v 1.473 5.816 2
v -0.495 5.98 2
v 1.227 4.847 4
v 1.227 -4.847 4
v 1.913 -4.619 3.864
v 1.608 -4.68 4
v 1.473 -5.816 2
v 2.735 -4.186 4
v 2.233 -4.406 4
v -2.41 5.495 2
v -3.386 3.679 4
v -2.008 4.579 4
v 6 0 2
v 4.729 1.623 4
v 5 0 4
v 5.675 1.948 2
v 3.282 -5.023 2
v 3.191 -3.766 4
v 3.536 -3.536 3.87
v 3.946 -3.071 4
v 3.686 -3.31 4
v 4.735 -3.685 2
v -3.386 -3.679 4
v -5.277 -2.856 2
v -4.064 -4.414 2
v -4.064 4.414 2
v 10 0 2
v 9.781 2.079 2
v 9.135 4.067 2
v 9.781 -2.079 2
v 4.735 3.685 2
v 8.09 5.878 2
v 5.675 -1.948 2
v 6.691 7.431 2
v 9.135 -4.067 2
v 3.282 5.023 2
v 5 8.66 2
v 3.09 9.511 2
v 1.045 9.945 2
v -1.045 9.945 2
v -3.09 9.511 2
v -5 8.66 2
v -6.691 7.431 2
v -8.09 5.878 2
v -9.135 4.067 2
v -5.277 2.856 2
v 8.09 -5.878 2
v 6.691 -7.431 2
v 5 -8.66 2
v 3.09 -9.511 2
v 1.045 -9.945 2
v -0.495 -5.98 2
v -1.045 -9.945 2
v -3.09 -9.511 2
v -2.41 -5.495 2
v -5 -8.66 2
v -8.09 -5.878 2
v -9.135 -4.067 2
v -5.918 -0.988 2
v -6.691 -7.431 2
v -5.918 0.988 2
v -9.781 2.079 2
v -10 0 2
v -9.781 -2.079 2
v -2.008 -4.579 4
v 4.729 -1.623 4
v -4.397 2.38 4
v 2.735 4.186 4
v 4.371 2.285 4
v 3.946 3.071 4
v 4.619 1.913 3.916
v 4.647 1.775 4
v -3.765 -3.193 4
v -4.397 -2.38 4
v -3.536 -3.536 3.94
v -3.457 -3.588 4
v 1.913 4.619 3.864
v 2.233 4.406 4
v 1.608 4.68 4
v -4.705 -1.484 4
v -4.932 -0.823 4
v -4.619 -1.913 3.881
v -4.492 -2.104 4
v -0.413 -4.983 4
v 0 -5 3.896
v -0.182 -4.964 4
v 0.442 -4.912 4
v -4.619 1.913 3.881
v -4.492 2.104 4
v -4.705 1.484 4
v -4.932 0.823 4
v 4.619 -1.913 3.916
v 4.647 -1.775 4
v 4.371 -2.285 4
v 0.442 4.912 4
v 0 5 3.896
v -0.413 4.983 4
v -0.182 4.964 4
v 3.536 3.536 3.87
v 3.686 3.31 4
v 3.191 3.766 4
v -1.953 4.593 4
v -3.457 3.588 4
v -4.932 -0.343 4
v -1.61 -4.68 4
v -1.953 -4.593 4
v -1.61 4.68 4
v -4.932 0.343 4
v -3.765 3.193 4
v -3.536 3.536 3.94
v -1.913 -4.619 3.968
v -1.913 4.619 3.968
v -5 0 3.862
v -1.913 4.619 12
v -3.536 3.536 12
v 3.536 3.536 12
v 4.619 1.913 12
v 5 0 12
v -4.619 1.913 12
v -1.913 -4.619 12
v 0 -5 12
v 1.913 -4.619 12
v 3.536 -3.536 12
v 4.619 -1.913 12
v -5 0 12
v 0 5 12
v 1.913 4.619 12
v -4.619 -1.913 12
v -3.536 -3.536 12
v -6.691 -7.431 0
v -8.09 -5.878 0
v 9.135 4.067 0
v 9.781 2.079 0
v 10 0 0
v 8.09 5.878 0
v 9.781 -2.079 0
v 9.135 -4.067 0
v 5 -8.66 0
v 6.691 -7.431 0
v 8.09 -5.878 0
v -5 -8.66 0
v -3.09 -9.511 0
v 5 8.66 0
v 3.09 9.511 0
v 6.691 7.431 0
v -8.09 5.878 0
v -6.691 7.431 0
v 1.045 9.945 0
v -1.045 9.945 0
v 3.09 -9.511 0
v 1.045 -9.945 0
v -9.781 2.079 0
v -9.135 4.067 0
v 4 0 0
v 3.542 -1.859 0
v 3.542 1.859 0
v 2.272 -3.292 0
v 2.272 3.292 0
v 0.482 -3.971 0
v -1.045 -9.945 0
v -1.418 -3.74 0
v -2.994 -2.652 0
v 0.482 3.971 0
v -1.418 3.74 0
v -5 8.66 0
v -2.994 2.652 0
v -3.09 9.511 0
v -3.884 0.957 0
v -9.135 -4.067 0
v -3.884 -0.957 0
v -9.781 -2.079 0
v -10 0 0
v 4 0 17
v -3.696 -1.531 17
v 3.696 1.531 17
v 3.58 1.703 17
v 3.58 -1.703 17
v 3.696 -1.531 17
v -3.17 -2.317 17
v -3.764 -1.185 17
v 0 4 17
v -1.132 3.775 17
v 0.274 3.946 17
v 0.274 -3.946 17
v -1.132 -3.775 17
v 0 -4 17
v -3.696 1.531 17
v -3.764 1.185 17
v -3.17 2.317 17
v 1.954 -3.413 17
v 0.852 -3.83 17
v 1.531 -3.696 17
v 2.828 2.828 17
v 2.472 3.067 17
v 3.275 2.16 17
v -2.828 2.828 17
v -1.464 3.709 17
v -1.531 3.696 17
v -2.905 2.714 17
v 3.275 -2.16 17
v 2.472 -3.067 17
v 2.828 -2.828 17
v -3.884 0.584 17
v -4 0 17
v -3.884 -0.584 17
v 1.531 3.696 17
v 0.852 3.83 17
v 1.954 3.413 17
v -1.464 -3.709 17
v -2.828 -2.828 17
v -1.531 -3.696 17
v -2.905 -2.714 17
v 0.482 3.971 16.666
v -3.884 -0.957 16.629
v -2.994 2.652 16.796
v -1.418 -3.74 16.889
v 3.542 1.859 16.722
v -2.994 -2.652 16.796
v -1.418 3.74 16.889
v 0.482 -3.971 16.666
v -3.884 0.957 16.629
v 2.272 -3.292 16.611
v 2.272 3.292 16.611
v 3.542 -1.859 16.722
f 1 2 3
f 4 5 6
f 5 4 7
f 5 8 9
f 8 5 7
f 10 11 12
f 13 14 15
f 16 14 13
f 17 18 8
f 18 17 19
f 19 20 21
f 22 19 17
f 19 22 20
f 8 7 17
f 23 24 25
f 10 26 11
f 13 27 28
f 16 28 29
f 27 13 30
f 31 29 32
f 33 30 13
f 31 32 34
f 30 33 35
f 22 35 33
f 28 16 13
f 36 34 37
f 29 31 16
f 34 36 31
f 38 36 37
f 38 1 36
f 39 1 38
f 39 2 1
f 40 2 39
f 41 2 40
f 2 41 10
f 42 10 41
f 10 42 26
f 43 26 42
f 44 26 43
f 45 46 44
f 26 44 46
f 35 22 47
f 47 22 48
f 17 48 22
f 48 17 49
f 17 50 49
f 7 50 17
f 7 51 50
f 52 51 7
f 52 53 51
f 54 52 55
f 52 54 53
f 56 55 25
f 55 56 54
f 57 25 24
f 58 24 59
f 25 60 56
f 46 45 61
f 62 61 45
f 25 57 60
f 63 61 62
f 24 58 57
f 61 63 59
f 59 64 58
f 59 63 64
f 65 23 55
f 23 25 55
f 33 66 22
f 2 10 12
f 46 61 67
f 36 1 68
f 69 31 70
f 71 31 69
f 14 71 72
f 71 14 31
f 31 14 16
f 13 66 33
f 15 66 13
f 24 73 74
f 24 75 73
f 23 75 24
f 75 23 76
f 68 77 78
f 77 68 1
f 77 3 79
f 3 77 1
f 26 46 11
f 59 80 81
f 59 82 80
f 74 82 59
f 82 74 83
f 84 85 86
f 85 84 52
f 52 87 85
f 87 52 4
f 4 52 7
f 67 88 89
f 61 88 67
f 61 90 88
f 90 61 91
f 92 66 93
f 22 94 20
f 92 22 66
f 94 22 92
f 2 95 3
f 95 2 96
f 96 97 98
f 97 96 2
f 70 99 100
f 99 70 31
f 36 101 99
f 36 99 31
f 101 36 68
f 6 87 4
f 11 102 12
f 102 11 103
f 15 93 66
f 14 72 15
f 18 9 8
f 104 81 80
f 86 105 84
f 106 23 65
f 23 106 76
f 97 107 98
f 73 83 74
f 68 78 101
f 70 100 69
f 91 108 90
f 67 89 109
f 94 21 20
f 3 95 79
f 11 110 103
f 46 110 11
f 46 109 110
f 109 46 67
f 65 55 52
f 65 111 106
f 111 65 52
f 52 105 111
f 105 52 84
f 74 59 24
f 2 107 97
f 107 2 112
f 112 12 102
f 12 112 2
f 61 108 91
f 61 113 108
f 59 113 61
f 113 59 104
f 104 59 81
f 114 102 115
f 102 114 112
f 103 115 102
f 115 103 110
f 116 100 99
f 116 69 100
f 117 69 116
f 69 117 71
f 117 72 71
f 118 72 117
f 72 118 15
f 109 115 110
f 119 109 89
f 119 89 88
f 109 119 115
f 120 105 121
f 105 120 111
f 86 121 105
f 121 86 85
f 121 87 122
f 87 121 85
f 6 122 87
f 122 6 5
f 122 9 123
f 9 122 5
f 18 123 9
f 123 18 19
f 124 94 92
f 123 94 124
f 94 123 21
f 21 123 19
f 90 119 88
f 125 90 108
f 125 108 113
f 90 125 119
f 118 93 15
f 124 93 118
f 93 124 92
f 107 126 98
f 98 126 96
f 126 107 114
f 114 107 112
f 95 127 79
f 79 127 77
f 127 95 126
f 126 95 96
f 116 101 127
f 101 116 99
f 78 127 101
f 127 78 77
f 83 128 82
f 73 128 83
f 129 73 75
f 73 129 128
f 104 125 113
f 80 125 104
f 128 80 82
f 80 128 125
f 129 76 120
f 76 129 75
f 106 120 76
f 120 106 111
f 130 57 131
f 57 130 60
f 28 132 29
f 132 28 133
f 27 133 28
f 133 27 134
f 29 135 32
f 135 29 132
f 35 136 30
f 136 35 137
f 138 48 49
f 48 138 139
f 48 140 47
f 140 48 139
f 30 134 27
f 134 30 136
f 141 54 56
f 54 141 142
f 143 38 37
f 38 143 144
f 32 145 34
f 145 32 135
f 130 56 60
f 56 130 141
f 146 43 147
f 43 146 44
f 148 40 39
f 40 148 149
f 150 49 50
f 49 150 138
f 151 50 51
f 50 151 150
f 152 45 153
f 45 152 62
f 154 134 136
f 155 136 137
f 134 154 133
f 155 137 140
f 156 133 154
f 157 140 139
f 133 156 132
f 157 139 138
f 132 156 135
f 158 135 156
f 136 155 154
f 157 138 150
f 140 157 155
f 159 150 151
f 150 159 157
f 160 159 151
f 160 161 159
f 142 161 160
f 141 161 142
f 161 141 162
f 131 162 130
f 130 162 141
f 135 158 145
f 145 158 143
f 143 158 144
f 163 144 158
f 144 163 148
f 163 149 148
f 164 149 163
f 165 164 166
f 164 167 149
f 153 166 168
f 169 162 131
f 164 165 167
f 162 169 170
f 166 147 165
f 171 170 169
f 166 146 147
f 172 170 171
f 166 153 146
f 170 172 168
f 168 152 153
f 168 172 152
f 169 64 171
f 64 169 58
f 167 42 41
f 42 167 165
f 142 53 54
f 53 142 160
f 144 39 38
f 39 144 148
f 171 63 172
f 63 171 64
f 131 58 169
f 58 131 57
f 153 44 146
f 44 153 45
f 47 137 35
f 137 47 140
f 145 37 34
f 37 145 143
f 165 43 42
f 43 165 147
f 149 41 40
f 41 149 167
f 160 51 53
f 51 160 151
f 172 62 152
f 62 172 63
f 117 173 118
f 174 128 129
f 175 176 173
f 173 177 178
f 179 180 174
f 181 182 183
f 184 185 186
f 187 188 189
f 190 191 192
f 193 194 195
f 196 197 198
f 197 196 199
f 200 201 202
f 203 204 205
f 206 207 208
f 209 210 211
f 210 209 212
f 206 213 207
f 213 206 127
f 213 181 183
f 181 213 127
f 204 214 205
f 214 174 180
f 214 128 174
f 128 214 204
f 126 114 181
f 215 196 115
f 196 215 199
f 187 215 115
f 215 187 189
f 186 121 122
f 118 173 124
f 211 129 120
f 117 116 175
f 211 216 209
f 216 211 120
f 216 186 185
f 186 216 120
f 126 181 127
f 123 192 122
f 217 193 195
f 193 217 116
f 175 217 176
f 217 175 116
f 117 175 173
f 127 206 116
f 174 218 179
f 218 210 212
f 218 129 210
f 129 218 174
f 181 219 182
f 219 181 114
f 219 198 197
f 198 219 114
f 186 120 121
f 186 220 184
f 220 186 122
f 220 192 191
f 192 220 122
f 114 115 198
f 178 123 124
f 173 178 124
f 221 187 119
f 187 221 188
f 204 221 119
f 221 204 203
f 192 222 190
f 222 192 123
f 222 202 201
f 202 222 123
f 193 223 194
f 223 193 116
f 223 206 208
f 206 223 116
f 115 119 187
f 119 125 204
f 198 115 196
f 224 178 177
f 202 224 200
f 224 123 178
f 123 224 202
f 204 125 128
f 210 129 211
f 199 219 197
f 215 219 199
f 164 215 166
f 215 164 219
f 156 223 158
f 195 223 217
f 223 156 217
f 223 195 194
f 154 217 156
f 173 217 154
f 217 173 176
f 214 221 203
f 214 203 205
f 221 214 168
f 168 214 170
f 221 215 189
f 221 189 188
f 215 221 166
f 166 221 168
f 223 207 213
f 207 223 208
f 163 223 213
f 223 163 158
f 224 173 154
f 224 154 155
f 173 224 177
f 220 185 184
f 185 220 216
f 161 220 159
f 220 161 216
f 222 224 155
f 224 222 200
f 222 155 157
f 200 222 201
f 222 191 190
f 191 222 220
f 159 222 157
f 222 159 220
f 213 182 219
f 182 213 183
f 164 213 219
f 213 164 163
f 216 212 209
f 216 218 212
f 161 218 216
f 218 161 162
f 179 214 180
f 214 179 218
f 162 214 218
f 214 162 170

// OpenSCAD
// coaxial wall plug

od = 10;
id = 8;

base_d = 20;
base_h = 2;

stem_h = 15;

chamfer_h = 5;
basechamfer_h = 2;
basechamfer_d = 2 + od;

module plug() {
cylinder(d=base_d, h=base_h);
translate([0, 0, base_h]) {
  cylinder(d1=basechamfer_d, d2=od, h=basechamfer_h);
  cylinder(d=od, h=stem_h-chamfer_h);
}
translate([0, 0, base_h+stem_h-chamfer_h])
  cylinder(d1=od, d2=id, h=chamfer_h);
}

difference() {
    plug();
    cylinder(d=id, h=base_h+stem_h);
}
